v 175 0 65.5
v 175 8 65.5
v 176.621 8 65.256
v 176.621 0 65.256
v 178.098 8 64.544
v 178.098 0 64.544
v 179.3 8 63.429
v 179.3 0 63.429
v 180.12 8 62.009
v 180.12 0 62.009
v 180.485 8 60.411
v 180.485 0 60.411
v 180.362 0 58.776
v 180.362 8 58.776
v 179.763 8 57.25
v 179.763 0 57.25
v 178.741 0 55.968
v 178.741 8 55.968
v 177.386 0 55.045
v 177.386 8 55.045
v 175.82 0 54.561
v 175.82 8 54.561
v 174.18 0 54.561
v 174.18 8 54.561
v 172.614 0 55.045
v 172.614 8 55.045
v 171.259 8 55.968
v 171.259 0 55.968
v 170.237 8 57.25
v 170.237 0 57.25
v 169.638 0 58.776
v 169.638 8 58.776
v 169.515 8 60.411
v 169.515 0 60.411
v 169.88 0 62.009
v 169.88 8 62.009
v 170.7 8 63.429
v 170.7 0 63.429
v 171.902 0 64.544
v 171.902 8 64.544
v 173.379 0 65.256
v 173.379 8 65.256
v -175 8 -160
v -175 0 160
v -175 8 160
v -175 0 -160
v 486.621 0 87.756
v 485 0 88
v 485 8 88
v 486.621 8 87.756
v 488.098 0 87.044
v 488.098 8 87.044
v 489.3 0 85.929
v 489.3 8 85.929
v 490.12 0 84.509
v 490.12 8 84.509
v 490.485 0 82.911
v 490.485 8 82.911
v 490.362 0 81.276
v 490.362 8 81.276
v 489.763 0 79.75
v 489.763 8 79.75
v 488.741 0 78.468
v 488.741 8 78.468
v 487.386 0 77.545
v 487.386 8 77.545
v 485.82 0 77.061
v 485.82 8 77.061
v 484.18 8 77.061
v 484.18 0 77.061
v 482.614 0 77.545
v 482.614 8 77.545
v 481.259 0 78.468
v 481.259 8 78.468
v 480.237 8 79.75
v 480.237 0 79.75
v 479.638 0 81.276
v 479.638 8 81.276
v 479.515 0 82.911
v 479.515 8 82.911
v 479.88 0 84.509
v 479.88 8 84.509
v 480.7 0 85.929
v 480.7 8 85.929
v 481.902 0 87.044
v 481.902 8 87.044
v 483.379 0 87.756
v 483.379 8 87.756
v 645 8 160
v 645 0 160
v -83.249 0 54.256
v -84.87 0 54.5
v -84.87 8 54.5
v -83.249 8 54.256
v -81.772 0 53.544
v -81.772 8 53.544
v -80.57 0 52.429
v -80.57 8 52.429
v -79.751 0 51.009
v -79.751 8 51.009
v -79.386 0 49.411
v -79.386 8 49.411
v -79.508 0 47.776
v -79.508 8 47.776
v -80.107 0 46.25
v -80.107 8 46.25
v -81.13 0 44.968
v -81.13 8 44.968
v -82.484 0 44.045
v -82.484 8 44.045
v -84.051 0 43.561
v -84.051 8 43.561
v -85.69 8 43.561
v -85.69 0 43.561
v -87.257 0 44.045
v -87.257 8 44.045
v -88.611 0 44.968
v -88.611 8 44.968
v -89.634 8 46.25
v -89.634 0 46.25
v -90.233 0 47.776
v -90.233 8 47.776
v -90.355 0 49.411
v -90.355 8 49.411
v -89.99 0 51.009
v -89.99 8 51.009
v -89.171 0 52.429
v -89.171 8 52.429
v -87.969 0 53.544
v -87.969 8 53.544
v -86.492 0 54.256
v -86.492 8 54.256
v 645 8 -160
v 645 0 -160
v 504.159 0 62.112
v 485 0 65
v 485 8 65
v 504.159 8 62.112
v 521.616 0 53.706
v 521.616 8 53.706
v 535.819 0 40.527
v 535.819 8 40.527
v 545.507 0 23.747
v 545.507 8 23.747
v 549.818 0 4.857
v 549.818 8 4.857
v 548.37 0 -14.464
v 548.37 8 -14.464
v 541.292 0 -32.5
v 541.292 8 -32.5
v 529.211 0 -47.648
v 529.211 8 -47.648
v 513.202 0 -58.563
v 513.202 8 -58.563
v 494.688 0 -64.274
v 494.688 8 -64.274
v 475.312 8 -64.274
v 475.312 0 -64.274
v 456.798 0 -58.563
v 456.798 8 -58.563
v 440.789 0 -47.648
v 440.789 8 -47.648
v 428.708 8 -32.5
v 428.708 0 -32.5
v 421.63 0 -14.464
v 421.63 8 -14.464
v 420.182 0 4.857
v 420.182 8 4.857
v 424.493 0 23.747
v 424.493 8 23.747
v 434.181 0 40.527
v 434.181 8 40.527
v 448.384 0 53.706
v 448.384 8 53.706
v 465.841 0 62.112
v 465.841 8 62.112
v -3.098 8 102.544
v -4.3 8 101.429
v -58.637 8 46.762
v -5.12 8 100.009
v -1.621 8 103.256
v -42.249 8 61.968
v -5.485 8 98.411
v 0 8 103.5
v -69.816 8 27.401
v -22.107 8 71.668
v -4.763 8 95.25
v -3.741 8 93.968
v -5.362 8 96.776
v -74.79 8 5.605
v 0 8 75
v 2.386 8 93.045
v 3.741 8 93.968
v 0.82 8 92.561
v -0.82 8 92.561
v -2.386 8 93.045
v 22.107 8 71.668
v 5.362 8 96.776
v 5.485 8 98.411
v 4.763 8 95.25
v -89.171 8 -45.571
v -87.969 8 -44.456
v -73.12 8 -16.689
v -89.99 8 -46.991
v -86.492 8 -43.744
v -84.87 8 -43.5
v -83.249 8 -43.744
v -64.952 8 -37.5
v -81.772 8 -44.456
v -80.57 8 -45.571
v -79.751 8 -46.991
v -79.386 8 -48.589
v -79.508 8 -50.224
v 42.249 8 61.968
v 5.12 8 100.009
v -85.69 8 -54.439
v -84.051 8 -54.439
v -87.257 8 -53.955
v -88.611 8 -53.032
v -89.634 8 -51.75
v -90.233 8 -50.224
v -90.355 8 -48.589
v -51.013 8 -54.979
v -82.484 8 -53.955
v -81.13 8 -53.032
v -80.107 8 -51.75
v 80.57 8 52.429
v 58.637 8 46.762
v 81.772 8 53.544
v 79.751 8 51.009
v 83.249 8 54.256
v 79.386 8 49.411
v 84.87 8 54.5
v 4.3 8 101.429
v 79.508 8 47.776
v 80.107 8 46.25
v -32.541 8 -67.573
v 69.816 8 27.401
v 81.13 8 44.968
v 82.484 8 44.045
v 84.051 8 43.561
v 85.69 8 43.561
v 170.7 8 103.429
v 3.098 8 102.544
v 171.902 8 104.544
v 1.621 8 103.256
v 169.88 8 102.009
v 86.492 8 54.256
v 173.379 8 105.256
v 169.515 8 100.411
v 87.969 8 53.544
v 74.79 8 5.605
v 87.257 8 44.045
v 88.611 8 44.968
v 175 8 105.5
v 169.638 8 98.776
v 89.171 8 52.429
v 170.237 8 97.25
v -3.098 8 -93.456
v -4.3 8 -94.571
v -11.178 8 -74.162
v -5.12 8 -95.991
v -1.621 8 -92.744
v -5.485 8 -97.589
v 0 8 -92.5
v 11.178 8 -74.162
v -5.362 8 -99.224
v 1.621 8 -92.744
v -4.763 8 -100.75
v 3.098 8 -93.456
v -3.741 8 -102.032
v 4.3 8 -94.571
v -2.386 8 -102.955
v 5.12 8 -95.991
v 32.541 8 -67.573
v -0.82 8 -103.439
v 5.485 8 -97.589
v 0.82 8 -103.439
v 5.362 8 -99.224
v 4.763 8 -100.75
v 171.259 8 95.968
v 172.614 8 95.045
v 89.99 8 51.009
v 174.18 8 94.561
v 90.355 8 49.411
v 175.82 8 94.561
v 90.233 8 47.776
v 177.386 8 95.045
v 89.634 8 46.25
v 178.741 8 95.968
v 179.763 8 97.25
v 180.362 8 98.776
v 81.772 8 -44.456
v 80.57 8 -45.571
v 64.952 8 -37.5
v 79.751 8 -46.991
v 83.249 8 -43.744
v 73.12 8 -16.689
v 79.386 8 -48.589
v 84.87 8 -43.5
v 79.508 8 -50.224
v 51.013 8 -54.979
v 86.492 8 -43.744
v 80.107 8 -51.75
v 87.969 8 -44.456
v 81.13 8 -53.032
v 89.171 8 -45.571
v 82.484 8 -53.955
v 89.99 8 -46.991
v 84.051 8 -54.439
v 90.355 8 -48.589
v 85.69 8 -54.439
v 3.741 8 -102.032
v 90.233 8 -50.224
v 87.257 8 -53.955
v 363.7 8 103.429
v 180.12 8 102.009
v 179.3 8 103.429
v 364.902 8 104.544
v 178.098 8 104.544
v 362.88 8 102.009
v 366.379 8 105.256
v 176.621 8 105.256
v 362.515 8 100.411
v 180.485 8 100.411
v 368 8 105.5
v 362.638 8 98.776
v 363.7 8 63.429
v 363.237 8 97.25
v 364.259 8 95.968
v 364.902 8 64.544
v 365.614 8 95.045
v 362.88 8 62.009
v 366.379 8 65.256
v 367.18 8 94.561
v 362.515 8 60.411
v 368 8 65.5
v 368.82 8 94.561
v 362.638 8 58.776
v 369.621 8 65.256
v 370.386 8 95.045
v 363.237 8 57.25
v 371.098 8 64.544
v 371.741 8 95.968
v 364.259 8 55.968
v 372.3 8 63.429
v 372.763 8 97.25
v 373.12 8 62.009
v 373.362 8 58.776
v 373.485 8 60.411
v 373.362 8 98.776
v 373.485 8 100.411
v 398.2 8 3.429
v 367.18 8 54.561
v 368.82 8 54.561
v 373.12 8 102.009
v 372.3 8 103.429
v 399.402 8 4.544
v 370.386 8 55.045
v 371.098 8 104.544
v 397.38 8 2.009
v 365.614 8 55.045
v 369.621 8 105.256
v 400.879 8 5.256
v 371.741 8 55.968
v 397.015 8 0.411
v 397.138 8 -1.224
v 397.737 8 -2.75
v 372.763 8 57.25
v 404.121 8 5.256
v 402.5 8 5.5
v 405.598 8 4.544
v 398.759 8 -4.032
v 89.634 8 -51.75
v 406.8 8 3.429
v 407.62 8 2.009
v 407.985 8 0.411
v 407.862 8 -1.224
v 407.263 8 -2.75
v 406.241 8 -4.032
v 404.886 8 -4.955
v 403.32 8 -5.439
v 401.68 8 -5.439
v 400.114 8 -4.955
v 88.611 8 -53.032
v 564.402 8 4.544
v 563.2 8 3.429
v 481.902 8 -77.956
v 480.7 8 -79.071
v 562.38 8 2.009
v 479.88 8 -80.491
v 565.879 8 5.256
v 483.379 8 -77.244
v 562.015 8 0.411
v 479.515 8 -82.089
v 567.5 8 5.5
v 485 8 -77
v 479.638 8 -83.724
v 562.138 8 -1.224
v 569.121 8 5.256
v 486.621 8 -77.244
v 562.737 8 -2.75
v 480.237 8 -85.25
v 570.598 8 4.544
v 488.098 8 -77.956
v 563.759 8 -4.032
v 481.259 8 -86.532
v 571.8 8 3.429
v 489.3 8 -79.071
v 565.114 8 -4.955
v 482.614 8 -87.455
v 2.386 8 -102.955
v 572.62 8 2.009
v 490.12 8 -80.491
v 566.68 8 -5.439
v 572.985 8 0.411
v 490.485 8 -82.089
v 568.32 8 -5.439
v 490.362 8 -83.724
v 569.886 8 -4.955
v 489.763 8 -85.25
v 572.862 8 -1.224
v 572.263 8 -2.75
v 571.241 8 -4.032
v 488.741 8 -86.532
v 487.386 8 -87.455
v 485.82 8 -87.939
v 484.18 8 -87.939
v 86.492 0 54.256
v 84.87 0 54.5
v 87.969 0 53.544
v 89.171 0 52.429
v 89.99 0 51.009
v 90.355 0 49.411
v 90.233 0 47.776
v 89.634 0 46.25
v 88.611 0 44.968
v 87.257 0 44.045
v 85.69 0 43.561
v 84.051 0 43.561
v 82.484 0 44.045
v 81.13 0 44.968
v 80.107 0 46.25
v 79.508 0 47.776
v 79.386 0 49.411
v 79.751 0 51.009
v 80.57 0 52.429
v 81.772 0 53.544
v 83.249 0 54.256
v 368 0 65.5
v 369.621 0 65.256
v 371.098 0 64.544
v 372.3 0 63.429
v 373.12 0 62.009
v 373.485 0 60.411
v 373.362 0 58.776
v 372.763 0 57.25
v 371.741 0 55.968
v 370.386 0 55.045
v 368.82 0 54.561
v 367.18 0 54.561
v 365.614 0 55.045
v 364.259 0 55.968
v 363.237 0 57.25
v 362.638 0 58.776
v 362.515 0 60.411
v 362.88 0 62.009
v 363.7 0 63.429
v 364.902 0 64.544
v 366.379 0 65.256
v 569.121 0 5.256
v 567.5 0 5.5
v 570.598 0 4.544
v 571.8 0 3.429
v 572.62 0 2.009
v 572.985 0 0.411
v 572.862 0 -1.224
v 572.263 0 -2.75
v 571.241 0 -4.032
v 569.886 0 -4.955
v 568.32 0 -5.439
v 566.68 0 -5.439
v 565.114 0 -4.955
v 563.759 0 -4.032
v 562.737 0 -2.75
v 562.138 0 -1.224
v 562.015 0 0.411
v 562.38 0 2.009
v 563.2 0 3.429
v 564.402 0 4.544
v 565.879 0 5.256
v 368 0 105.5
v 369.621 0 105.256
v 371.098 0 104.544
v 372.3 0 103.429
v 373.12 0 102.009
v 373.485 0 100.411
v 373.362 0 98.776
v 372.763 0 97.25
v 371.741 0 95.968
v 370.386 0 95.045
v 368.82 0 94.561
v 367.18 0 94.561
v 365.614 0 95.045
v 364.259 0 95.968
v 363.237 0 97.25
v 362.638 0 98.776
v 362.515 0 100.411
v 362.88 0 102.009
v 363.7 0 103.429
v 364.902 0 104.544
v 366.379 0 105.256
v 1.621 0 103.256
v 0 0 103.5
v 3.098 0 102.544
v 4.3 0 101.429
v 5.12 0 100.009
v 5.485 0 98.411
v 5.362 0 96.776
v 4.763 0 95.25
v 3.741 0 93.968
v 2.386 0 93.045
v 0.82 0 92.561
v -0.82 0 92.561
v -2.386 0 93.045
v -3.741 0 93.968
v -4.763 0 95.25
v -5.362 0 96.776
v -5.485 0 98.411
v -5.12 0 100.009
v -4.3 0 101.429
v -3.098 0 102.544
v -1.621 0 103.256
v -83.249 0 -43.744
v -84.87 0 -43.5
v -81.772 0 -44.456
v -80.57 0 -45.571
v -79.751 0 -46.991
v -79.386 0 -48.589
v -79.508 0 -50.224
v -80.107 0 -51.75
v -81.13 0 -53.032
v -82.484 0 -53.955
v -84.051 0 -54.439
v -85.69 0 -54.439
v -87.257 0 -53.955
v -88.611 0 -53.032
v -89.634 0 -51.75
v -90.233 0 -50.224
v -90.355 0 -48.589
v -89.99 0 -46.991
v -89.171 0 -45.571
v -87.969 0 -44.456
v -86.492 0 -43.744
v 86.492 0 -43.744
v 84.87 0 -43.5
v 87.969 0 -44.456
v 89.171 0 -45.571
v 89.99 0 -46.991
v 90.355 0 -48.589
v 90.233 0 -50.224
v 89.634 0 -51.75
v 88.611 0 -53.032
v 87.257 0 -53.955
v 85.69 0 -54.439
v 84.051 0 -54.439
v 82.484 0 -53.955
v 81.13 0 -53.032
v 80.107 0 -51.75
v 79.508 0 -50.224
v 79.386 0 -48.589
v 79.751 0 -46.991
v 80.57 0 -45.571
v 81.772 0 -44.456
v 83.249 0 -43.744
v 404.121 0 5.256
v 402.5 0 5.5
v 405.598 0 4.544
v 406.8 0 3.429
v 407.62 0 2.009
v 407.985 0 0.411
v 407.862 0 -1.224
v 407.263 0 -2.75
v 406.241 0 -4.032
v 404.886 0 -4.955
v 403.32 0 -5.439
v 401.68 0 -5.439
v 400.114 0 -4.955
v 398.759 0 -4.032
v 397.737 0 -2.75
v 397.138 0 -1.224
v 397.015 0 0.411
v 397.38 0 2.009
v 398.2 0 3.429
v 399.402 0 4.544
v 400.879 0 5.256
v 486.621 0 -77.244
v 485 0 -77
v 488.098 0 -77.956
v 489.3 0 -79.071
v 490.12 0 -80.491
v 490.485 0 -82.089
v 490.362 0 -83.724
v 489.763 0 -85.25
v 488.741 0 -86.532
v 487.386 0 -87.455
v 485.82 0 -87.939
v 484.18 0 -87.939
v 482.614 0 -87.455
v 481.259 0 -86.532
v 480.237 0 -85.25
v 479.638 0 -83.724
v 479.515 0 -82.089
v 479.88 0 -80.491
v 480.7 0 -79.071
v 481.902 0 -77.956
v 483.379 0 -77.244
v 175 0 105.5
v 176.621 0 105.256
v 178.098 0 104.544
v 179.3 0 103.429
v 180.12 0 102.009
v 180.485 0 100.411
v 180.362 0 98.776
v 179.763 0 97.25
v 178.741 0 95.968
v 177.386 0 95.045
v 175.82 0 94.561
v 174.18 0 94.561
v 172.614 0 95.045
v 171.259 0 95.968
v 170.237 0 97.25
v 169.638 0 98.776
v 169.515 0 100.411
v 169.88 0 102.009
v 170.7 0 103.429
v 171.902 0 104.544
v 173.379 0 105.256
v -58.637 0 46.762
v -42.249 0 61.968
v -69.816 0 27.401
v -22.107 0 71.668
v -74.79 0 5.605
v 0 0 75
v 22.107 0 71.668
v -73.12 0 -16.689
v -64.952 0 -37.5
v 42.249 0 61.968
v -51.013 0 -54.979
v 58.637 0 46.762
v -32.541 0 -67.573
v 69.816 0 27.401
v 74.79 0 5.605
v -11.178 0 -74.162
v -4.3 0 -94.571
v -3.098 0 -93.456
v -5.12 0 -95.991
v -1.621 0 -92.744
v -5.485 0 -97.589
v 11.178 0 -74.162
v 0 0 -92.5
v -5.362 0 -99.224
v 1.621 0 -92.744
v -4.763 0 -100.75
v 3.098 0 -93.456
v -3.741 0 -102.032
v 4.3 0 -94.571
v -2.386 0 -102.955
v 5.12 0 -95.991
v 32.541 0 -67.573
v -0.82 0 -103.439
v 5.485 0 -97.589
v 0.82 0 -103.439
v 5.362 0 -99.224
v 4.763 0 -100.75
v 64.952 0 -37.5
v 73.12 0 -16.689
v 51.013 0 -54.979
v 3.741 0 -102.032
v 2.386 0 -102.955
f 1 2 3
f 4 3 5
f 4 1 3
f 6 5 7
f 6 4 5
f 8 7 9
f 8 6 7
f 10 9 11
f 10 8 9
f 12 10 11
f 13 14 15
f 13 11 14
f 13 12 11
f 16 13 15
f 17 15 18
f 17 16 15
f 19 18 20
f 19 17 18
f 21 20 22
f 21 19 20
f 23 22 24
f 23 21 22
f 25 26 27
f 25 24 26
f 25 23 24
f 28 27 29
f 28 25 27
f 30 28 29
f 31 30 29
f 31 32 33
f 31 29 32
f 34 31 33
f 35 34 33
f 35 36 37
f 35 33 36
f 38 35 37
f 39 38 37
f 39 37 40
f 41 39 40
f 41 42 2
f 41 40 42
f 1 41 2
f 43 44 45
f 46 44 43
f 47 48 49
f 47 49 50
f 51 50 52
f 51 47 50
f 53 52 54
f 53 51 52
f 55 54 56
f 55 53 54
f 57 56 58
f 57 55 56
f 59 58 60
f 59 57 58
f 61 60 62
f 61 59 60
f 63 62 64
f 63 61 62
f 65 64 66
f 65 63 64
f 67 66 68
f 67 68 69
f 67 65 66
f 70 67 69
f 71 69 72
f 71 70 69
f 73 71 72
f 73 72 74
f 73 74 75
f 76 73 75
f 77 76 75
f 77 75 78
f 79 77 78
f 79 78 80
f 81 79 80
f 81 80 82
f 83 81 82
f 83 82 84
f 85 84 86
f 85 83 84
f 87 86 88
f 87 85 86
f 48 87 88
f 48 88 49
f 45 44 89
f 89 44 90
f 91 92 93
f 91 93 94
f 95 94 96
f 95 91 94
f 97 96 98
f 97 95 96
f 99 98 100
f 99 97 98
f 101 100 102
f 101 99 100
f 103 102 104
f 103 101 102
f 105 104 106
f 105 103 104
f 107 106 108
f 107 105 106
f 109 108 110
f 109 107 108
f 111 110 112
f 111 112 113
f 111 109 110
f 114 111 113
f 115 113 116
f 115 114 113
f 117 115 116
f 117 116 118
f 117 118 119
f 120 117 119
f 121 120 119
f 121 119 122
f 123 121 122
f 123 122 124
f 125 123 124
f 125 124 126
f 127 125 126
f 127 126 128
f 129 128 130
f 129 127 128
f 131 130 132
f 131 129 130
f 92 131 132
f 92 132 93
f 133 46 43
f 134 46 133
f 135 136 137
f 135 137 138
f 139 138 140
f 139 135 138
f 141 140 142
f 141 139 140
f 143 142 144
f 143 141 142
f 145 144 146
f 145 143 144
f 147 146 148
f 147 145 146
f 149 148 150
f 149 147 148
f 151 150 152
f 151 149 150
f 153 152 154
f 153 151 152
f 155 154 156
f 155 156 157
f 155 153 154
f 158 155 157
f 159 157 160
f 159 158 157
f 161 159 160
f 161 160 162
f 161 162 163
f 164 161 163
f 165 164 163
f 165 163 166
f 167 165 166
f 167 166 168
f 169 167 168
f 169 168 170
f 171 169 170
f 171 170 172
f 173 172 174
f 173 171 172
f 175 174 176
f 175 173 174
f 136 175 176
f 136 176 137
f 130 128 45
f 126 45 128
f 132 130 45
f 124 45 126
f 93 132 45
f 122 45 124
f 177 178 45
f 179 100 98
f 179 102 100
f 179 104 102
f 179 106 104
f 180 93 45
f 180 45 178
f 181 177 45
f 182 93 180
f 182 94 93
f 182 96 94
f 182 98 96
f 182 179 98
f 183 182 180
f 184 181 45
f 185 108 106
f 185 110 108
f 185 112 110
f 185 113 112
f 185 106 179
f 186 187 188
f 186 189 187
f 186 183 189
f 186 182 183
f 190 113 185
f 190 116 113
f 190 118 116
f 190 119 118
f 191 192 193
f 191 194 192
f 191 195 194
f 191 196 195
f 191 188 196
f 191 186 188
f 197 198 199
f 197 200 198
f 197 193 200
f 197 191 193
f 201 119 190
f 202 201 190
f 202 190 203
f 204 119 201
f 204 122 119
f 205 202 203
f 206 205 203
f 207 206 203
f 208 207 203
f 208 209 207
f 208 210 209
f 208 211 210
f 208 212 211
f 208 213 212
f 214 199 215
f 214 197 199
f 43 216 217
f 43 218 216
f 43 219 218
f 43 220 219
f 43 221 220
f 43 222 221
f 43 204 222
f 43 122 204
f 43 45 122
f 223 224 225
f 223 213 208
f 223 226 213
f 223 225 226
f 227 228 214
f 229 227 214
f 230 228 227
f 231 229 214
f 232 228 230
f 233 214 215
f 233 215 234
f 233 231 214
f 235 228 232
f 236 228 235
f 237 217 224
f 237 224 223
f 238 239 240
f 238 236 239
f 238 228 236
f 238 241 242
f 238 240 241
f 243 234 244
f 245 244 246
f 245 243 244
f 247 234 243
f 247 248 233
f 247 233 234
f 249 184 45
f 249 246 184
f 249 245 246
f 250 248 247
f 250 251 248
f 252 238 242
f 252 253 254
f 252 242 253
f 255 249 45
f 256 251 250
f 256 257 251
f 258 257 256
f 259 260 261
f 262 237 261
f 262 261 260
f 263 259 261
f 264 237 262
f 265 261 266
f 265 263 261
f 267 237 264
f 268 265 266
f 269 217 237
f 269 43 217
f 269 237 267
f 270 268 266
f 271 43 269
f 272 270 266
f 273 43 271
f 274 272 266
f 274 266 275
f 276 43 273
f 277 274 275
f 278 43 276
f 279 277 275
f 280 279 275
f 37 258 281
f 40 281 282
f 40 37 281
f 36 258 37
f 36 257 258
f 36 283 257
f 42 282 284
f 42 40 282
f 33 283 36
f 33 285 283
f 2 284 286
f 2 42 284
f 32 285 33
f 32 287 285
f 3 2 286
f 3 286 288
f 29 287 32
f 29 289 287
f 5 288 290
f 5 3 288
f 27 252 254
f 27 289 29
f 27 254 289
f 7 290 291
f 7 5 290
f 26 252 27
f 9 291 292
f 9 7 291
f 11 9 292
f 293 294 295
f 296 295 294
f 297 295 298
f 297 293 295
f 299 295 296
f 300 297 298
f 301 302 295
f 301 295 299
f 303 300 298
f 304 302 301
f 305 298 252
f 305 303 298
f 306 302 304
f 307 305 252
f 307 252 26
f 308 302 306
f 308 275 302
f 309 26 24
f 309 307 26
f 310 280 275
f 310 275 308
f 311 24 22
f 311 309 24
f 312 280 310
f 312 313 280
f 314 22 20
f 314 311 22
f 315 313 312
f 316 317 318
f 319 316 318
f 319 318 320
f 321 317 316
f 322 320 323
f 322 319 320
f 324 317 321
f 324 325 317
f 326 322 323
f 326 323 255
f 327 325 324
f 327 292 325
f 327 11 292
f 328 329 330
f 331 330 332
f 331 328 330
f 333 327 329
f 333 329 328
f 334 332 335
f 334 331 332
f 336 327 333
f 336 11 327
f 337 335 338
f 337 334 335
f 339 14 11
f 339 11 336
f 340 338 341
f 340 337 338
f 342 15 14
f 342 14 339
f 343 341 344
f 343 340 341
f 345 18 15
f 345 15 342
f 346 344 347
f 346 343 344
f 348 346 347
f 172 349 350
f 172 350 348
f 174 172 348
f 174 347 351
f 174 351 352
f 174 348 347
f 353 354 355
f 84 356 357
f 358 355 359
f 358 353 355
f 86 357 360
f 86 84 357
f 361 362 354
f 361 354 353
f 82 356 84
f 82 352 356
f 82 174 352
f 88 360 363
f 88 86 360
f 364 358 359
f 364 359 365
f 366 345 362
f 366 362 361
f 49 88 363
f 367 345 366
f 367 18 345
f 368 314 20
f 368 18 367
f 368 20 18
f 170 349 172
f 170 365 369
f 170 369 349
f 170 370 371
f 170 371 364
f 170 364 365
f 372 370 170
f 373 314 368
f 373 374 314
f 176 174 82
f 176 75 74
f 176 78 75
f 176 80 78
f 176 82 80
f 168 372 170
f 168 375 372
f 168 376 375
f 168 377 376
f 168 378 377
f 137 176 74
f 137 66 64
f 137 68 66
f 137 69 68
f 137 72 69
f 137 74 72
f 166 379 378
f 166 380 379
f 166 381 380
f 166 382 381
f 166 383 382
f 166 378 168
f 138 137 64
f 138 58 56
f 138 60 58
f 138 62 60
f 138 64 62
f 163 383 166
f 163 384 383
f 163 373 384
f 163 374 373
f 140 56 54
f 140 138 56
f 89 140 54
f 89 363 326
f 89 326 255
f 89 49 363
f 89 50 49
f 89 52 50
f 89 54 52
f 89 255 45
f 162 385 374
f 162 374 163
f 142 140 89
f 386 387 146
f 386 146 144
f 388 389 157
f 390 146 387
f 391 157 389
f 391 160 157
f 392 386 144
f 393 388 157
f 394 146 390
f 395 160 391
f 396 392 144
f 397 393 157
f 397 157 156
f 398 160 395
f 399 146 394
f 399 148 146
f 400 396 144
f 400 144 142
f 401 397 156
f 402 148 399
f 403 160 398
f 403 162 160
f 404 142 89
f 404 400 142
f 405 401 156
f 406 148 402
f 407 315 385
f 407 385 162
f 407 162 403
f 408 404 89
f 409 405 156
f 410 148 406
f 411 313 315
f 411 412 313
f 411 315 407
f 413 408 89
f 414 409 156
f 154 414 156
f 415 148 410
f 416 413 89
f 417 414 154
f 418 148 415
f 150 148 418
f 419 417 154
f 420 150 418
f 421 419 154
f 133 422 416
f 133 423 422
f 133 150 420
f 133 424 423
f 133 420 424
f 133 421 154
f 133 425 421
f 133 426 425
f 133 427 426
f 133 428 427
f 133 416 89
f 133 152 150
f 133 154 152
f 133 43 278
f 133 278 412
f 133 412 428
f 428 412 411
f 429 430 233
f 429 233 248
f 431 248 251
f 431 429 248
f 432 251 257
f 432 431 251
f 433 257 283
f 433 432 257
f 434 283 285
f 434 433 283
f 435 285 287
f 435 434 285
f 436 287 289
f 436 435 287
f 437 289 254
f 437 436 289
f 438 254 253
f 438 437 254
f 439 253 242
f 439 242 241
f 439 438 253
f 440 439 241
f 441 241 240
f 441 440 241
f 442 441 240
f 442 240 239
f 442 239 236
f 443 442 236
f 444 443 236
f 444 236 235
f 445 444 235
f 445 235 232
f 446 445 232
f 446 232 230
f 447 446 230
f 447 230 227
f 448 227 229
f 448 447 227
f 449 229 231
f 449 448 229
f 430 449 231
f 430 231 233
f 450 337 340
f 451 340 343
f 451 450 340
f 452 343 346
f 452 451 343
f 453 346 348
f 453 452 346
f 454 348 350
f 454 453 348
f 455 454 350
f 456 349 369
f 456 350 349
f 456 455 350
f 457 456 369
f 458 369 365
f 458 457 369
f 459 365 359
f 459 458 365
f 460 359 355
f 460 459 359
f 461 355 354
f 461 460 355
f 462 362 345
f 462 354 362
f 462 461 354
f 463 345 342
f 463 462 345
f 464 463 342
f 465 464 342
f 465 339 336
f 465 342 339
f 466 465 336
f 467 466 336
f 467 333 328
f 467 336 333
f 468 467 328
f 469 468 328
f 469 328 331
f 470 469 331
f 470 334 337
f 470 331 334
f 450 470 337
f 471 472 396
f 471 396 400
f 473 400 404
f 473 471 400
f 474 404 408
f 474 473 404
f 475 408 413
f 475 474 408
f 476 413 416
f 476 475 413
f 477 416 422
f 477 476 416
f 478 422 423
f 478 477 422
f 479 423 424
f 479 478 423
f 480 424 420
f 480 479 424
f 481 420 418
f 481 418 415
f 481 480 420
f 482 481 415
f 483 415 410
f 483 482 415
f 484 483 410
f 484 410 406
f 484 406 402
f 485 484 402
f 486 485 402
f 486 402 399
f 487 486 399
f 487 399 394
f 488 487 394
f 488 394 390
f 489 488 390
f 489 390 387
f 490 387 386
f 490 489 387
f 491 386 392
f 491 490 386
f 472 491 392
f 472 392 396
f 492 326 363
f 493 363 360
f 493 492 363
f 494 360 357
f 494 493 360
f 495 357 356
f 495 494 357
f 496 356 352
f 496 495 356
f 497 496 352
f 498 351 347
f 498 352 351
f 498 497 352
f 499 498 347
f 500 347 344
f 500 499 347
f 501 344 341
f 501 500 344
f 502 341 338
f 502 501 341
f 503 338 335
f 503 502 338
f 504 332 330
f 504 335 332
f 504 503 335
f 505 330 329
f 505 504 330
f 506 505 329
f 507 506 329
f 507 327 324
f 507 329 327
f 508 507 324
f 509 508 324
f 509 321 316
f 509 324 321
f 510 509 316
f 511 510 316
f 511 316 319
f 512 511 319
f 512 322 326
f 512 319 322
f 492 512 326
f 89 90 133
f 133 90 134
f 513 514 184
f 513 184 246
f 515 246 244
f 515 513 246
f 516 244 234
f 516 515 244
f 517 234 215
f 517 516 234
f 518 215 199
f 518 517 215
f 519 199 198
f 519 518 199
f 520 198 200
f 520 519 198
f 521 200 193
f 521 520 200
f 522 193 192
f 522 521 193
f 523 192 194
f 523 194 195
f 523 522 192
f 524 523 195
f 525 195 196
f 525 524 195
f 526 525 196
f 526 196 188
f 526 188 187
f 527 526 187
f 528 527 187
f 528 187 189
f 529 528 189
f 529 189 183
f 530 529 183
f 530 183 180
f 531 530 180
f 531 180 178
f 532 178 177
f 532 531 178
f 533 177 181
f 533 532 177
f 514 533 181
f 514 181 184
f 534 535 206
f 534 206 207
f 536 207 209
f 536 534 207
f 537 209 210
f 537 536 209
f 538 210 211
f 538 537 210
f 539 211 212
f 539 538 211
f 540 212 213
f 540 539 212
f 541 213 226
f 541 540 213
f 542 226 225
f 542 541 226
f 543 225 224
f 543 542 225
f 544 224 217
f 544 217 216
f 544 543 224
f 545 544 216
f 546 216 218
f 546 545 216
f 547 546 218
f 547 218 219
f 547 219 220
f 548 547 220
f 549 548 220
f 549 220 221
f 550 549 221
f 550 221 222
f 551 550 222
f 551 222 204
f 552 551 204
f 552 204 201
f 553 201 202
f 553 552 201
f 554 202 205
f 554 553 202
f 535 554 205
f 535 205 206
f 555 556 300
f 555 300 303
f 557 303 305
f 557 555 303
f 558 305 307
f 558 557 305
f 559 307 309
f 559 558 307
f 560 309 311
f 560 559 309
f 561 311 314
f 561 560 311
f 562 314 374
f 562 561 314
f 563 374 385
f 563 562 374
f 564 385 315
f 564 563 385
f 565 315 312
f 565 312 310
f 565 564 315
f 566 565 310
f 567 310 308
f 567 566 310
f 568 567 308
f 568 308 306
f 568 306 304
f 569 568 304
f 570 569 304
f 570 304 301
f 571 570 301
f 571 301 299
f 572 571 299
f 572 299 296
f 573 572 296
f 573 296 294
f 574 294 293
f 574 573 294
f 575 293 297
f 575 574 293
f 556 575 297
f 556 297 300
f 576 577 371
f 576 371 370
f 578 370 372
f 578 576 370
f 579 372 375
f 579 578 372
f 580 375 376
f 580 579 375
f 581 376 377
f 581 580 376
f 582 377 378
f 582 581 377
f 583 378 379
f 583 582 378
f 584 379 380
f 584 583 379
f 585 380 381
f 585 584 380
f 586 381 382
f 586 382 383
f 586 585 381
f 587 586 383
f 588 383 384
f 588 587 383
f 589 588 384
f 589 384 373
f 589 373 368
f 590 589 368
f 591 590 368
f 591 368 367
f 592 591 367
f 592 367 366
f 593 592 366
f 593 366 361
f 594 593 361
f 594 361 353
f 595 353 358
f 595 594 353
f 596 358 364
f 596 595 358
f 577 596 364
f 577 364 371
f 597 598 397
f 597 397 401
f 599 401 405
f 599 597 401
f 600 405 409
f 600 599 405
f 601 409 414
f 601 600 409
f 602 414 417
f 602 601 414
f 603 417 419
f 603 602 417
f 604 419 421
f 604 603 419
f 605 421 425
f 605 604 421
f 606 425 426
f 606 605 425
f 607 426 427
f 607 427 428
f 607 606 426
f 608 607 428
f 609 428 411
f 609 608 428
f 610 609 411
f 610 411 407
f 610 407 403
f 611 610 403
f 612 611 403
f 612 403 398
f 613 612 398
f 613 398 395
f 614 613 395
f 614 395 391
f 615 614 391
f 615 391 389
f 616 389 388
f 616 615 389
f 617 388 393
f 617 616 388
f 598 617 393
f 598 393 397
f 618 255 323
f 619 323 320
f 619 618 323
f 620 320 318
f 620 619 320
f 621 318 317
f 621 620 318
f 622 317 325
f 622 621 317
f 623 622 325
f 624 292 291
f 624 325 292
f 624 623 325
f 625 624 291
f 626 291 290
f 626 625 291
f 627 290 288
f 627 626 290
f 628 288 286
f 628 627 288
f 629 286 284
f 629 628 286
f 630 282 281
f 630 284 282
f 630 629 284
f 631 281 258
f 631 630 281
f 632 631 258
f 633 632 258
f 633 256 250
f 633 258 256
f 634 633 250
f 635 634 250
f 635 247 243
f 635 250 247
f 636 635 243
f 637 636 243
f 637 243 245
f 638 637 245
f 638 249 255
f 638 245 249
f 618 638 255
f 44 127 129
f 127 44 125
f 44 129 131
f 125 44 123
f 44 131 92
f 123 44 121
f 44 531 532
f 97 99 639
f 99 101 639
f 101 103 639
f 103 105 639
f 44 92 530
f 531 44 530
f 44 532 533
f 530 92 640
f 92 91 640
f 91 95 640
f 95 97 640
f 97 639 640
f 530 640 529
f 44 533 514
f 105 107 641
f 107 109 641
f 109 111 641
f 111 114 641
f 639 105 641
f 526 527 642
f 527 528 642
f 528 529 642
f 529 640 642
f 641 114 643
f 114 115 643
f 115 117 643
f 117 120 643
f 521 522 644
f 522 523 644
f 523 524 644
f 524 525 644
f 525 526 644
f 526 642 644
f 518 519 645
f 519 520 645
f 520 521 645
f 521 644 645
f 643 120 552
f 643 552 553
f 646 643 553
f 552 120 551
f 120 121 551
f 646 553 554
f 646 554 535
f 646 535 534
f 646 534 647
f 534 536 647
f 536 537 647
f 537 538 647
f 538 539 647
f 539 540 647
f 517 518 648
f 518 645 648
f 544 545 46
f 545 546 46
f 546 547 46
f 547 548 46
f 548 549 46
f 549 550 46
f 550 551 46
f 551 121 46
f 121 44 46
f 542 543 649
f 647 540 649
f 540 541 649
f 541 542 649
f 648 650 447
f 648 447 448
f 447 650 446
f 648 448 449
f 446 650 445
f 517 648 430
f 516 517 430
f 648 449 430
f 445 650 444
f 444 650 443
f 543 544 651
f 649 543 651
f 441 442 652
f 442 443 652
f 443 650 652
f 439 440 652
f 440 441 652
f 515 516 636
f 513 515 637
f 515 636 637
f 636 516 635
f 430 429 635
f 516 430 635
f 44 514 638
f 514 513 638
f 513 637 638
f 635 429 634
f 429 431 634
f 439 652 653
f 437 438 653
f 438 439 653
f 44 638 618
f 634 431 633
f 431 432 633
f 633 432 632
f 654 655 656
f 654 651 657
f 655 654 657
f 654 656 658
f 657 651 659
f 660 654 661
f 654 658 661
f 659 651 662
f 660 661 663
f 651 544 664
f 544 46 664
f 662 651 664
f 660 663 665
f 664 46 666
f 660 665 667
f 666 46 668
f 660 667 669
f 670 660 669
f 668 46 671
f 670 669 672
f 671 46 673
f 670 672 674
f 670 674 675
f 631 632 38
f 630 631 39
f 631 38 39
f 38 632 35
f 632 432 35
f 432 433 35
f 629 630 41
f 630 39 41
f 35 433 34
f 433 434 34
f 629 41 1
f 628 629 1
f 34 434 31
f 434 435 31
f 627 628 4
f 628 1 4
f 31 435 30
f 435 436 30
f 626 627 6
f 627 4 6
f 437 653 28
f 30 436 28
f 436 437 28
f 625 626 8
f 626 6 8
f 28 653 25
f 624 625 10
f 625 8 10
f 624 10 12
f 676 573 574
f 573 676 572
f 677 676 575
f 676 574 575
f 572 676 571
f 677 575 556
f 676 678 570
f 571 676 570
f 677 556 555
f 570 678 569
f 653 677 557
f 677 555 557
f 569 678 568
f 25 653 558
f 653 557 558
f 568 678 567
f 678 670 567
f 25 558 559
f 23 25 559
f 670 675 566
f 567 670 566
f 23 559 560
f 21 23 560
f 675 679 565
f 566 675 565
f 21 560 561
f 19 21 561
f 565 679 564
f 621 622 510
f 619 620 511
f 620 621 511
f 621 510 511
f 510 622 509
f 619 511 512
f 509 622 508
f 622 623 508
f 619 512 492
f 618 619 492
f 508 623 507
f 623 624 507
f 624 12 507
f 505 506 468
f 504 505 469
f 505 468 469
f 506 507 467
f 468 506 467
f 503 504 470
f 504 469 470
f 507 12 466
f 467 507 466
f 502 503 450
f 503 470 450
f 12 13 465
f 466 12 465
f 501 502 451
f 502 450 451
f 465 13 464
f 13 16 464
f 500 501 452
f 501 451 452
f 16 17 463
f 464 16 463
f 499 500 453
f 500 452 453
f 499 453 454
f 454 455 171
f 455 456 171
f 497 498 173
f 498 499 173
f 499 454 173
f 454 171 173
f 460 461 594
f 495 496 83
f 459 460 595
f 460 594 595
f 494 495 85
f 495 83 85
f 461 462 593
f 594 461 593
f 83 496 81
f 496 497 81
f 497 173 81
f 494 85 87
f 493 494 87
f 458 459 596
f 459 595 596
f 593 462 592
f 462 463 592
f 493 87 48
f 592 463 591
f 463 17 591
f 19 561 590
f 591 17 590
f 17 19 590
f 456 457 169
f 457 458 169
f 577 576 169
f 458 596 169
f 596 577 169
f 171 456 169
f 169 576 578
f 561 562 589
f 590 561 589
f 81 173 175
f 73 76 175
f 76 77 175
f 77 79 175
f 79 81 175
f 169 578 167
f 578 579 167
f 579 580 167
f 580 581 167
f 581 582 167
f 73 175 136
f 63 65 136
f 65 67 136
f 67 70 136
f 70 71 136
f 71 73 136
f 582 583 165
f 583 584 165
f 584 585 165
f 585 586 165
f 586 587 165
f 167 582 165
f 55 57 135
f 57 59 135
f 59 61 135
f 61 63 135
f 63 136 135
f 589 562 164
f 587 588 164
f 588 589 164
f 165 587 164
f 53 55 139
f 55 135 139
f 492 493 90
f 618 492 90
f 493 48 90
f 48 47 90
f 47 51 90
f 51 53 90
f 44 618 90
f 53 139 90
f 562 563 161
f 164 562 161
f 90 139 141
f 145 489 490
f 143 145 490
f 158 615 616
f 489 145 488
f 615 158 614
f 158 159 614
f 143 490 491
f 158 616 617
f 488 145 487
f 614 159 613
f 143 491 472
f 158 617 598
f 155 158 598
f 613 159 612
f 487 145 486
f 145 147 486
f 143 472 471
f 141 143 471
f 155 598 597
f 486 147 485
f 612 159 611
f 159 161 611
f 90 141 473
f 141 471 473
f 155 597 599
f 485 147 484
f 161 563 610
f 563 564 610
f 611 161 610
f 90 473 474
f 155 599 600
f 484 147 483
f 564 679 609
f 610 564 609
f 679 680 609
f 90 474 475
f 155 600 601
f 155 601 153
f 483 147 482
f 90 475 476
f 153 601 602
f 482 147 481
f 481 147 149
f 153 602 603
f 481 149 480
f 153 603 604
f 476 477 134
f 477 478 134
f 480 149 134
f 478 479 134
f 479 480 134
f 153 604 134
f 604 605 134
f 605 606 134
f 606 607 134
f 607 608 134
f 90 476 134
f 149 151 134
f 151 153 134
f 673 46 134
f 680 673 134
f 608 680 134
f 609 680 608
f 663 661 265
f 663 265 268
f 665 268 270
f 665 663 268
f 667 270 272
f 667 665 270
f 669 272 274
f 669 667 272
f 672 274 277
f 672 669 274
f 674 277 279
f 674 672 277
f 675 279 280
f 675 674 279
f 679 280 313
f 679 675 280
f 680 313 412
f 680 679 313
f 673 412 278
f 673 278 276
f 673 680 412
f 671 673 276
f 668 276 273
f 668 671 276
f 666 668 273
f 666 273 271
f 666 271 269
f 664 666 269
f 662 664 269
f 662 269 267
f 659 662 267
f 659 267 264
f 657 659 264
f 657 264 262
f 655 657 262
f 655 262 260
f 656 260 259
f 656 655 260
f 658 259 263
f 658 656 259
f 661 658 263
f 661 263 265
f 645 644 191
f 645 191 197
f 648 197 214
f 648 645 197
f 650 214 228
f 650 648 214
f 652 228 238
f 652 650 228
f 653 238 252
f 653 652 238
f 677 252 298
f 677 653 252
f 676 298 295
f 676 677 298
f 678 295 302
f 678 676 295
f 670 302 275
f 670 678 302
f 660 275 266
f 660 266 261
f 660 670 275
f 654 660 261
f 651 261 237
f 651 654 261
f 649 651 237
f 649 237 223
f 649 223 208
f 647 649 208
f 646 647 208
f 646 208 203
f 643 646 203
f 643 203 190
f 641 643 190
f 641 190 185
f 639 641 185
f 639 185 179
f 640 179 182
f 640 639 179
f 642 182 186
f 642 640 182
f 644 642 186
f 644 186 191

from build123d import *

# Parameters (mm, degrees)
SKETCH1_W           = 820
SKETCH1_H           = 320
SKETCH1_R           = 75
SKETCH1_R_2         = 5.5
SKETCH1_R_3         = 65
BOSS_EXTRUDE1_DEPTH = 8
SKETCH2_R           = 5.5
CUT_EXTRUDE2_DEPTH  = 10


with BuildPart() as part:
    # Sketch1 → Boss-Extrude1 (new body)
    with BuildSketch(Plane(origin=(0, 0, 0), x_dir=(1, 0, 0), z_dir=(0, 1, 0))):
        with Locations((235, 0)):
            Rectangle(SKETCH1_W, SKETCH1_H)
        with Locations(Location((0, 0, 0), (0, 0, 270))):
            Circle(SKETCH1_R, mode=Mode.SUBTRACT)
        with Locations(Location((0, -98, 0), (0, 0, 270))):
            Circle(SKETCH1_R_2, mode=Mode.SUBTRACT)
        with Locations(Location((-84.870489571, -49, 0), (0, 0, 270))):
            Circle(SKETCH1_R_2, mode=Mode.SUBTRACT)
        with Locations(Location((-84.870489571, 49, 0), (0, 0, 270))):
            Circle(SKETCH1_R_2, mode=Mode.SUBTRACT)
        with Locations(Location((0, 98, 0), (0, 0, 270))):
            Circle(SKETCH1_R_2, mode=Mode.SUBTRACT)
        with Locations(Location((84.870489571, 49, 0), (0, 0, 270))):
            Circle(SKETCH1_R_2, mode=Mode.SUBTRACT)
        with Locations(Location((84.870489571, -49, 0), (0, 0, 270))):
            Circle(SKETCH1_R_2, mode=Mode.SUBTRACT)
        with Locations(Location((485, 0, 0), (0, 0, 270))):
            Circle(SKETCH1_R_3, mode=Mode.SUBTRACT)
        with Locations(Location((567.5, 0, 0), (0, 0, 270))):
            Circle(SKETCH1_R_2, mode=Mode.SUBTRACT)
        with Locations(Location((485, -82.5, 0), (0, 0, 270))):
            Circle(SKETCH1_R_2, mode=Mode.SUBTRACT)
        with Locations(Location((402.5, 0, 0), (0, 0, 270))):
            Circle(SKETCH1_R_2, mode=Mode.SUBTRACT)
        with Locations(Location((485, 82.5, 0), (0, 0, 270))):
            Circle(SKETCH1_R_2, mode=Mode.SUBTRACT)
    extrude(amount=BOSS_EXTRUDE1_DEPTH)

    # Sketch2 → Cut-Extrude2 (cut)
    with BuildSketch(Plane(origin=(0, 0, 0), x_dir=(1, 0, 0), z_dir=(0, 1, 0))):
        with Locations(Location((175, -60, 0), (0, 0, 270))):
            Circle(SKETCH2_R)
        with Locations(Location((175, -100, 0), (0, 0, 270))):
            Circle(SKETCH2_R)
        with Locations(Location((368, -100, 0), (0, 0, 270))):
            Circle(SKETCH2_R)
        with Locations(Location((368, -60, 0), (0, 0, 270))):
            Circle(SKETCH2_R)
    extrude(amount=CUT_EXTRUDE2_DEPTH, mode=Mode.SUBTRACT)


solid = part.part
